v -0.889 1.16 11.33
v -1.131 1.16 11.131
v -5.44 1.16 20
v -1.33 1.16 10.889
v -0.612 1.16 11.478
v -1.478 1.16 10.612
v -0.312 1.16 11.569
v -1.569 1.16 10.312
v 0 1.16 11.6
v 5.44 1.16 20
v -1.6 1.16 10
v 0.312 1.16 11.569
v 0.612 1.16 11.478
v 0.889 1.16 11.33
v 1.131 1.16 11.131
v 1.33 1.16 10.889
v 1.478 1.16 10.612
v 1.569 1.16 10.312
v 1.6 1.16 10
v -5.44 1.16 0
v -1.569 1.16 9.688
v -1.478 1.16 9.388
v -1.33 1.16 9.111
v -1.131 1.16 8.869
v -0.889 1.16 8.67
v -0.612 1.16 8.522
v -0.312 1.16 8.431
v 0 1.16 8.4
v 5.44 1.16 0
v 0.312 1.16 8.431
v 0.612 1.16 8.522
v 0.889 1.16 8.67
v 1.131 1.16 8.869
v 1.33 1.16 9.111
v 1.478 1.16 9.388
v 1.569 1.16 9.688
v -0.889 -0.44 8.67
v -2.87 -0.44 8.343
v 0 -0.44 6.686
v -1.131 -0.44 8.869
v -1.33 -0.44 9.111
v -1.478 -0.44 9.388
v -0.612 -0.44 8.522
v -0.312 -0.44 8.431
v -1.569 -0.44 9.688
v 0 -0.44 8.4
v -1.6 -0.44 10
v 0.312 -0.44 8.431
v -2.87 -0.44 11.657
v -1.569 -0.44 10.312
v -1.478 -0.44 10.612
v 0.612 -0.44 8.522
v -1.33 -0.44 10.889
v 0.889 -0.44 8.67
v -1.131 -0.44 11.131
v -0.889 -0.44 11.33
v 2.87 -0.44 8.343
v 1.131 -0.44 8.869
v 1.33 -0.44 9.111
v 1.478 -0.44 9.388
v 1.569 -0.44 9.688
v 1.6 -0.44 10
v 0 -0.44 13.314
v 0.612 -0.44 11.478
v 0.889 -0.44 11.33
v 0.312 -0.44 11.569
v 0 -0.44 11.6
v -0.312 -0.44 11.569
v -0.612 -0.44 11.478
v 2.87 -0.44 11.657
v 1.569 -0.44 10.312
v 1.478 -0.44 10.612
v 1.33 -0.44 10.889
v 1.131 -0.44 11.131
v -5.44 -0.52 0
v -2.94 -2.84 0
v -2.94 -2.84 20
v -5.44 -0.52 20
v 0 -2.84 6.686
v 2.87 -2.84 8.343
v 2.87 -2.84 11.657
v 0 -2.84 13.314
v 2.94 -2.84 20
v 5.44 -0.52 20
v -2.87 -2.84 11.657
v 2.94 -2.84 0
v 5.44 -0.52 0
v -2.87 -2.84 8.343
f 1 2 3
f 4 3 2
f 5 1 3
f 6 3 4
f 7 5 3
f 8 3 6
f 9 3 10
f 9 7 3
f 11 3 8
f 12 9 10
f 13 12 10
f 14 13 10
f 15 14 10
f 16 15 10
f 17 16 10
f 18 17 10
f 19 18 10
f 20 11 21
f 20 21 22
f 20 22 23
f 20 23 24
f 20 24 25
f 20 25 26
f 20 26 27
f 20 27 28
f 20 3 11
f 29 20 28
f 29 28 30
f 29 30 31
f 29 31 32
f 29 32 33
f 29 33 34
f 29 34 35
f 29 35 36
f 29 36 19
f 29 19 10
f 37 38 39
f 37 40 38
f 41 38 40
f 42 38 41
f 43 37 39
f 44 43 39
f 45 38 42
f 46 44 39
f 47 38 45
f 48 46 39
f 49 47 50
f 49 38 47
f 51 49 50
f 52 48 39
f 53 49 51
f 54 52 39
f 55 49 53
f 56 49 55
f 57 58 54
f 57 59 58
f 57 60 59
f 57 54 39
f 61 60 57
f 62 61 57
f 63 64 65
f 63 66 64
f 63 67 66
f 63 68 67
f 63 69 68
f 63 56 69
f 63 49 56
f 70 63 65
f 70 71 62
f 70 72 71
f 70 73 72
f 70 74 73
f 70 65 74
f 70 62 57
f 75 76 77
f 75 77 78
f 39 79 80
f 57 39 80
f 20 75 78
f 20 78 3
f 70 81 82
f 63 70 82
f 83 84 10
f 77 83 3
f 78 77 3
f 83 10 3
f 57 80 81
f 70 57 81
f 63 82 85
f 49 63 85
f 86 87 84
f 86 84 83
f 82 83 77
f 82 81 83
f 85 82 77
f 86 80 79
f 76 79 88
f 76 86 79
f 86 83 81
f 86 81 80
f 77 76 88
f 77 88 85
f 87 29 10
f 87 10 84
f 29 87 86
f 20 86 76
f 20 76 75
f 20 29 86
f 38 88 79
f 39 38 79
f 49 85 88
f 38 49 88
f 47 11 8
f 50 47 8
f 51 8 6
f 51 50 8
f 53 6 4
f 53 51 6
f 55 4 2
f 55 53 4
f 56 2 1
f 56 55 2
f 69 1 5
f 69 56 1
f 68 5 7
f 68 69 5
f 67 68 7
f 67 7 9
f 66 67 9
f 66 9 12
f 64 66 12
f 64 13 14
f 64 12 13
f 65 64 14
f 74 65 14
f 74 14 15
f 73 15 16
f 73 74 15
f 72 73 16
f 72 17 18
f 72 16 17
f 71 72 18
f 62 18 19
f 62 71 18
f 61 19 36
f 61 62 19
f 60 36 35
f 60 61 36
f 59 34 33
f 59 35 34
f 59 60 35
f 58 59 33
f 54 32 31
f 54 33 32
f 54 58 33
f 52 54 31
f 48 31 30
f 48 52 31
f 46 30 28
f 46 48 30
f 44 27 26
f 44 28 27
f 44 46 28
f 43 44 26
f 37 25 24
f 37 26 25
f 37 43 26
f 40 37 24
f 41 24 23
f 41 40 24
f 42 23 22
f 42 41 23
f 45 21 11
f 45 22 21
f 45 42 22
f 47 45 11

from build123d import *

# Parameters (mm, degrees)
PAD_DEPTH       = 20
SKETCH001_R     = 1.6
POCKET_DEPTH    = 5.68
SKETCH002_W     = 5
SKETCH002_H     = 5
SKETCH002_R     = 1.6
PAD001_DEPTH    = 1
SKETCH003_R     = 1.6
POCKET001_DEPTH = 2.4
SKETCH004_W     = 5.88
SKETCH004_H     = 2.68
POCKET002_DEPTH = 20.001


with BuildPart() as part:
    # Sketch → Pad (new body)
    with BuildSketch(Plane.XY):
        Polygon((2.94, -2.84), (-2.94, -2.84), (-5.44, -0.52), (-5.44, 1.16), (-2.94, 1.16), (-2.94, 2.84), (2.94, 2.84), (2.94, 1.16), (5.44, 1.16), (5.44, -0.52), align=None)
    extrude(amount=PAD_DEPTH)

    # Sketch001 (on Face6 of Pad) → Pocket (cut)
    with BuildSketch(Plane(origin=(0, 2.84, 0), x_dir=(-1, 0, 0), z_dir=(0, 1, 0))):
        with Locations((0, 10)):
            Circle(SKETCH001_R)
    extrude(amount=-POCKET_DEPTH, mode=Mode.SUBTRACT)

    # Sketch002 (on Face11 of Pocket) → Pad001 (join)
    with BuildSketch(Plane(origin=(0, 2.84, 0), x_dir=(-1, 0, 0), z_dir=(0, 1, 0))):
        with Locations((0, 10)):
            Rectangle(SKETCH002_W, SKETCH002_H)
        with Locations((0, 10)):
            Circle(SKETCH002_R, mode=Mode.SUBTRACT)
    extrude(amount=PAD001_DEPTH)

    # Sketch003 (on Face1 of Pad001) → Pocket001 (cut)
    with BuildSketch(Plane.XZ.offset(2.84)):
        Polygon((0, 6.686009), (2.87, 8.343005), (2.87, 11.656995), (0, 13.313991), (-2.87, 11.656995), (-2.87, 8.343005), align=None)
        with Locations((0, 10)):
            Circle(SKETCH003_R, mode=Mode.SUBTRACT)
    extrude(amount=-POCKET001_DEPTH, mode=Mode.SUBTRACT)

    # Sketch004 (on Face3 of Pocket001) → Pocket002 (cut, through all)
    with BuildSketch(Plane(origin=(0, 0, 0), x_dir=(1, 0, 0), z_dir=(0, 0, -1))):
        with Locations((0, -2.5)):
            Rectangle(SKETCH004_W, SKETCH004_H)
    extrude(amount=-POCKET002_DEPTH, mode=Mode.SUBTRACT)


solid = part.part
